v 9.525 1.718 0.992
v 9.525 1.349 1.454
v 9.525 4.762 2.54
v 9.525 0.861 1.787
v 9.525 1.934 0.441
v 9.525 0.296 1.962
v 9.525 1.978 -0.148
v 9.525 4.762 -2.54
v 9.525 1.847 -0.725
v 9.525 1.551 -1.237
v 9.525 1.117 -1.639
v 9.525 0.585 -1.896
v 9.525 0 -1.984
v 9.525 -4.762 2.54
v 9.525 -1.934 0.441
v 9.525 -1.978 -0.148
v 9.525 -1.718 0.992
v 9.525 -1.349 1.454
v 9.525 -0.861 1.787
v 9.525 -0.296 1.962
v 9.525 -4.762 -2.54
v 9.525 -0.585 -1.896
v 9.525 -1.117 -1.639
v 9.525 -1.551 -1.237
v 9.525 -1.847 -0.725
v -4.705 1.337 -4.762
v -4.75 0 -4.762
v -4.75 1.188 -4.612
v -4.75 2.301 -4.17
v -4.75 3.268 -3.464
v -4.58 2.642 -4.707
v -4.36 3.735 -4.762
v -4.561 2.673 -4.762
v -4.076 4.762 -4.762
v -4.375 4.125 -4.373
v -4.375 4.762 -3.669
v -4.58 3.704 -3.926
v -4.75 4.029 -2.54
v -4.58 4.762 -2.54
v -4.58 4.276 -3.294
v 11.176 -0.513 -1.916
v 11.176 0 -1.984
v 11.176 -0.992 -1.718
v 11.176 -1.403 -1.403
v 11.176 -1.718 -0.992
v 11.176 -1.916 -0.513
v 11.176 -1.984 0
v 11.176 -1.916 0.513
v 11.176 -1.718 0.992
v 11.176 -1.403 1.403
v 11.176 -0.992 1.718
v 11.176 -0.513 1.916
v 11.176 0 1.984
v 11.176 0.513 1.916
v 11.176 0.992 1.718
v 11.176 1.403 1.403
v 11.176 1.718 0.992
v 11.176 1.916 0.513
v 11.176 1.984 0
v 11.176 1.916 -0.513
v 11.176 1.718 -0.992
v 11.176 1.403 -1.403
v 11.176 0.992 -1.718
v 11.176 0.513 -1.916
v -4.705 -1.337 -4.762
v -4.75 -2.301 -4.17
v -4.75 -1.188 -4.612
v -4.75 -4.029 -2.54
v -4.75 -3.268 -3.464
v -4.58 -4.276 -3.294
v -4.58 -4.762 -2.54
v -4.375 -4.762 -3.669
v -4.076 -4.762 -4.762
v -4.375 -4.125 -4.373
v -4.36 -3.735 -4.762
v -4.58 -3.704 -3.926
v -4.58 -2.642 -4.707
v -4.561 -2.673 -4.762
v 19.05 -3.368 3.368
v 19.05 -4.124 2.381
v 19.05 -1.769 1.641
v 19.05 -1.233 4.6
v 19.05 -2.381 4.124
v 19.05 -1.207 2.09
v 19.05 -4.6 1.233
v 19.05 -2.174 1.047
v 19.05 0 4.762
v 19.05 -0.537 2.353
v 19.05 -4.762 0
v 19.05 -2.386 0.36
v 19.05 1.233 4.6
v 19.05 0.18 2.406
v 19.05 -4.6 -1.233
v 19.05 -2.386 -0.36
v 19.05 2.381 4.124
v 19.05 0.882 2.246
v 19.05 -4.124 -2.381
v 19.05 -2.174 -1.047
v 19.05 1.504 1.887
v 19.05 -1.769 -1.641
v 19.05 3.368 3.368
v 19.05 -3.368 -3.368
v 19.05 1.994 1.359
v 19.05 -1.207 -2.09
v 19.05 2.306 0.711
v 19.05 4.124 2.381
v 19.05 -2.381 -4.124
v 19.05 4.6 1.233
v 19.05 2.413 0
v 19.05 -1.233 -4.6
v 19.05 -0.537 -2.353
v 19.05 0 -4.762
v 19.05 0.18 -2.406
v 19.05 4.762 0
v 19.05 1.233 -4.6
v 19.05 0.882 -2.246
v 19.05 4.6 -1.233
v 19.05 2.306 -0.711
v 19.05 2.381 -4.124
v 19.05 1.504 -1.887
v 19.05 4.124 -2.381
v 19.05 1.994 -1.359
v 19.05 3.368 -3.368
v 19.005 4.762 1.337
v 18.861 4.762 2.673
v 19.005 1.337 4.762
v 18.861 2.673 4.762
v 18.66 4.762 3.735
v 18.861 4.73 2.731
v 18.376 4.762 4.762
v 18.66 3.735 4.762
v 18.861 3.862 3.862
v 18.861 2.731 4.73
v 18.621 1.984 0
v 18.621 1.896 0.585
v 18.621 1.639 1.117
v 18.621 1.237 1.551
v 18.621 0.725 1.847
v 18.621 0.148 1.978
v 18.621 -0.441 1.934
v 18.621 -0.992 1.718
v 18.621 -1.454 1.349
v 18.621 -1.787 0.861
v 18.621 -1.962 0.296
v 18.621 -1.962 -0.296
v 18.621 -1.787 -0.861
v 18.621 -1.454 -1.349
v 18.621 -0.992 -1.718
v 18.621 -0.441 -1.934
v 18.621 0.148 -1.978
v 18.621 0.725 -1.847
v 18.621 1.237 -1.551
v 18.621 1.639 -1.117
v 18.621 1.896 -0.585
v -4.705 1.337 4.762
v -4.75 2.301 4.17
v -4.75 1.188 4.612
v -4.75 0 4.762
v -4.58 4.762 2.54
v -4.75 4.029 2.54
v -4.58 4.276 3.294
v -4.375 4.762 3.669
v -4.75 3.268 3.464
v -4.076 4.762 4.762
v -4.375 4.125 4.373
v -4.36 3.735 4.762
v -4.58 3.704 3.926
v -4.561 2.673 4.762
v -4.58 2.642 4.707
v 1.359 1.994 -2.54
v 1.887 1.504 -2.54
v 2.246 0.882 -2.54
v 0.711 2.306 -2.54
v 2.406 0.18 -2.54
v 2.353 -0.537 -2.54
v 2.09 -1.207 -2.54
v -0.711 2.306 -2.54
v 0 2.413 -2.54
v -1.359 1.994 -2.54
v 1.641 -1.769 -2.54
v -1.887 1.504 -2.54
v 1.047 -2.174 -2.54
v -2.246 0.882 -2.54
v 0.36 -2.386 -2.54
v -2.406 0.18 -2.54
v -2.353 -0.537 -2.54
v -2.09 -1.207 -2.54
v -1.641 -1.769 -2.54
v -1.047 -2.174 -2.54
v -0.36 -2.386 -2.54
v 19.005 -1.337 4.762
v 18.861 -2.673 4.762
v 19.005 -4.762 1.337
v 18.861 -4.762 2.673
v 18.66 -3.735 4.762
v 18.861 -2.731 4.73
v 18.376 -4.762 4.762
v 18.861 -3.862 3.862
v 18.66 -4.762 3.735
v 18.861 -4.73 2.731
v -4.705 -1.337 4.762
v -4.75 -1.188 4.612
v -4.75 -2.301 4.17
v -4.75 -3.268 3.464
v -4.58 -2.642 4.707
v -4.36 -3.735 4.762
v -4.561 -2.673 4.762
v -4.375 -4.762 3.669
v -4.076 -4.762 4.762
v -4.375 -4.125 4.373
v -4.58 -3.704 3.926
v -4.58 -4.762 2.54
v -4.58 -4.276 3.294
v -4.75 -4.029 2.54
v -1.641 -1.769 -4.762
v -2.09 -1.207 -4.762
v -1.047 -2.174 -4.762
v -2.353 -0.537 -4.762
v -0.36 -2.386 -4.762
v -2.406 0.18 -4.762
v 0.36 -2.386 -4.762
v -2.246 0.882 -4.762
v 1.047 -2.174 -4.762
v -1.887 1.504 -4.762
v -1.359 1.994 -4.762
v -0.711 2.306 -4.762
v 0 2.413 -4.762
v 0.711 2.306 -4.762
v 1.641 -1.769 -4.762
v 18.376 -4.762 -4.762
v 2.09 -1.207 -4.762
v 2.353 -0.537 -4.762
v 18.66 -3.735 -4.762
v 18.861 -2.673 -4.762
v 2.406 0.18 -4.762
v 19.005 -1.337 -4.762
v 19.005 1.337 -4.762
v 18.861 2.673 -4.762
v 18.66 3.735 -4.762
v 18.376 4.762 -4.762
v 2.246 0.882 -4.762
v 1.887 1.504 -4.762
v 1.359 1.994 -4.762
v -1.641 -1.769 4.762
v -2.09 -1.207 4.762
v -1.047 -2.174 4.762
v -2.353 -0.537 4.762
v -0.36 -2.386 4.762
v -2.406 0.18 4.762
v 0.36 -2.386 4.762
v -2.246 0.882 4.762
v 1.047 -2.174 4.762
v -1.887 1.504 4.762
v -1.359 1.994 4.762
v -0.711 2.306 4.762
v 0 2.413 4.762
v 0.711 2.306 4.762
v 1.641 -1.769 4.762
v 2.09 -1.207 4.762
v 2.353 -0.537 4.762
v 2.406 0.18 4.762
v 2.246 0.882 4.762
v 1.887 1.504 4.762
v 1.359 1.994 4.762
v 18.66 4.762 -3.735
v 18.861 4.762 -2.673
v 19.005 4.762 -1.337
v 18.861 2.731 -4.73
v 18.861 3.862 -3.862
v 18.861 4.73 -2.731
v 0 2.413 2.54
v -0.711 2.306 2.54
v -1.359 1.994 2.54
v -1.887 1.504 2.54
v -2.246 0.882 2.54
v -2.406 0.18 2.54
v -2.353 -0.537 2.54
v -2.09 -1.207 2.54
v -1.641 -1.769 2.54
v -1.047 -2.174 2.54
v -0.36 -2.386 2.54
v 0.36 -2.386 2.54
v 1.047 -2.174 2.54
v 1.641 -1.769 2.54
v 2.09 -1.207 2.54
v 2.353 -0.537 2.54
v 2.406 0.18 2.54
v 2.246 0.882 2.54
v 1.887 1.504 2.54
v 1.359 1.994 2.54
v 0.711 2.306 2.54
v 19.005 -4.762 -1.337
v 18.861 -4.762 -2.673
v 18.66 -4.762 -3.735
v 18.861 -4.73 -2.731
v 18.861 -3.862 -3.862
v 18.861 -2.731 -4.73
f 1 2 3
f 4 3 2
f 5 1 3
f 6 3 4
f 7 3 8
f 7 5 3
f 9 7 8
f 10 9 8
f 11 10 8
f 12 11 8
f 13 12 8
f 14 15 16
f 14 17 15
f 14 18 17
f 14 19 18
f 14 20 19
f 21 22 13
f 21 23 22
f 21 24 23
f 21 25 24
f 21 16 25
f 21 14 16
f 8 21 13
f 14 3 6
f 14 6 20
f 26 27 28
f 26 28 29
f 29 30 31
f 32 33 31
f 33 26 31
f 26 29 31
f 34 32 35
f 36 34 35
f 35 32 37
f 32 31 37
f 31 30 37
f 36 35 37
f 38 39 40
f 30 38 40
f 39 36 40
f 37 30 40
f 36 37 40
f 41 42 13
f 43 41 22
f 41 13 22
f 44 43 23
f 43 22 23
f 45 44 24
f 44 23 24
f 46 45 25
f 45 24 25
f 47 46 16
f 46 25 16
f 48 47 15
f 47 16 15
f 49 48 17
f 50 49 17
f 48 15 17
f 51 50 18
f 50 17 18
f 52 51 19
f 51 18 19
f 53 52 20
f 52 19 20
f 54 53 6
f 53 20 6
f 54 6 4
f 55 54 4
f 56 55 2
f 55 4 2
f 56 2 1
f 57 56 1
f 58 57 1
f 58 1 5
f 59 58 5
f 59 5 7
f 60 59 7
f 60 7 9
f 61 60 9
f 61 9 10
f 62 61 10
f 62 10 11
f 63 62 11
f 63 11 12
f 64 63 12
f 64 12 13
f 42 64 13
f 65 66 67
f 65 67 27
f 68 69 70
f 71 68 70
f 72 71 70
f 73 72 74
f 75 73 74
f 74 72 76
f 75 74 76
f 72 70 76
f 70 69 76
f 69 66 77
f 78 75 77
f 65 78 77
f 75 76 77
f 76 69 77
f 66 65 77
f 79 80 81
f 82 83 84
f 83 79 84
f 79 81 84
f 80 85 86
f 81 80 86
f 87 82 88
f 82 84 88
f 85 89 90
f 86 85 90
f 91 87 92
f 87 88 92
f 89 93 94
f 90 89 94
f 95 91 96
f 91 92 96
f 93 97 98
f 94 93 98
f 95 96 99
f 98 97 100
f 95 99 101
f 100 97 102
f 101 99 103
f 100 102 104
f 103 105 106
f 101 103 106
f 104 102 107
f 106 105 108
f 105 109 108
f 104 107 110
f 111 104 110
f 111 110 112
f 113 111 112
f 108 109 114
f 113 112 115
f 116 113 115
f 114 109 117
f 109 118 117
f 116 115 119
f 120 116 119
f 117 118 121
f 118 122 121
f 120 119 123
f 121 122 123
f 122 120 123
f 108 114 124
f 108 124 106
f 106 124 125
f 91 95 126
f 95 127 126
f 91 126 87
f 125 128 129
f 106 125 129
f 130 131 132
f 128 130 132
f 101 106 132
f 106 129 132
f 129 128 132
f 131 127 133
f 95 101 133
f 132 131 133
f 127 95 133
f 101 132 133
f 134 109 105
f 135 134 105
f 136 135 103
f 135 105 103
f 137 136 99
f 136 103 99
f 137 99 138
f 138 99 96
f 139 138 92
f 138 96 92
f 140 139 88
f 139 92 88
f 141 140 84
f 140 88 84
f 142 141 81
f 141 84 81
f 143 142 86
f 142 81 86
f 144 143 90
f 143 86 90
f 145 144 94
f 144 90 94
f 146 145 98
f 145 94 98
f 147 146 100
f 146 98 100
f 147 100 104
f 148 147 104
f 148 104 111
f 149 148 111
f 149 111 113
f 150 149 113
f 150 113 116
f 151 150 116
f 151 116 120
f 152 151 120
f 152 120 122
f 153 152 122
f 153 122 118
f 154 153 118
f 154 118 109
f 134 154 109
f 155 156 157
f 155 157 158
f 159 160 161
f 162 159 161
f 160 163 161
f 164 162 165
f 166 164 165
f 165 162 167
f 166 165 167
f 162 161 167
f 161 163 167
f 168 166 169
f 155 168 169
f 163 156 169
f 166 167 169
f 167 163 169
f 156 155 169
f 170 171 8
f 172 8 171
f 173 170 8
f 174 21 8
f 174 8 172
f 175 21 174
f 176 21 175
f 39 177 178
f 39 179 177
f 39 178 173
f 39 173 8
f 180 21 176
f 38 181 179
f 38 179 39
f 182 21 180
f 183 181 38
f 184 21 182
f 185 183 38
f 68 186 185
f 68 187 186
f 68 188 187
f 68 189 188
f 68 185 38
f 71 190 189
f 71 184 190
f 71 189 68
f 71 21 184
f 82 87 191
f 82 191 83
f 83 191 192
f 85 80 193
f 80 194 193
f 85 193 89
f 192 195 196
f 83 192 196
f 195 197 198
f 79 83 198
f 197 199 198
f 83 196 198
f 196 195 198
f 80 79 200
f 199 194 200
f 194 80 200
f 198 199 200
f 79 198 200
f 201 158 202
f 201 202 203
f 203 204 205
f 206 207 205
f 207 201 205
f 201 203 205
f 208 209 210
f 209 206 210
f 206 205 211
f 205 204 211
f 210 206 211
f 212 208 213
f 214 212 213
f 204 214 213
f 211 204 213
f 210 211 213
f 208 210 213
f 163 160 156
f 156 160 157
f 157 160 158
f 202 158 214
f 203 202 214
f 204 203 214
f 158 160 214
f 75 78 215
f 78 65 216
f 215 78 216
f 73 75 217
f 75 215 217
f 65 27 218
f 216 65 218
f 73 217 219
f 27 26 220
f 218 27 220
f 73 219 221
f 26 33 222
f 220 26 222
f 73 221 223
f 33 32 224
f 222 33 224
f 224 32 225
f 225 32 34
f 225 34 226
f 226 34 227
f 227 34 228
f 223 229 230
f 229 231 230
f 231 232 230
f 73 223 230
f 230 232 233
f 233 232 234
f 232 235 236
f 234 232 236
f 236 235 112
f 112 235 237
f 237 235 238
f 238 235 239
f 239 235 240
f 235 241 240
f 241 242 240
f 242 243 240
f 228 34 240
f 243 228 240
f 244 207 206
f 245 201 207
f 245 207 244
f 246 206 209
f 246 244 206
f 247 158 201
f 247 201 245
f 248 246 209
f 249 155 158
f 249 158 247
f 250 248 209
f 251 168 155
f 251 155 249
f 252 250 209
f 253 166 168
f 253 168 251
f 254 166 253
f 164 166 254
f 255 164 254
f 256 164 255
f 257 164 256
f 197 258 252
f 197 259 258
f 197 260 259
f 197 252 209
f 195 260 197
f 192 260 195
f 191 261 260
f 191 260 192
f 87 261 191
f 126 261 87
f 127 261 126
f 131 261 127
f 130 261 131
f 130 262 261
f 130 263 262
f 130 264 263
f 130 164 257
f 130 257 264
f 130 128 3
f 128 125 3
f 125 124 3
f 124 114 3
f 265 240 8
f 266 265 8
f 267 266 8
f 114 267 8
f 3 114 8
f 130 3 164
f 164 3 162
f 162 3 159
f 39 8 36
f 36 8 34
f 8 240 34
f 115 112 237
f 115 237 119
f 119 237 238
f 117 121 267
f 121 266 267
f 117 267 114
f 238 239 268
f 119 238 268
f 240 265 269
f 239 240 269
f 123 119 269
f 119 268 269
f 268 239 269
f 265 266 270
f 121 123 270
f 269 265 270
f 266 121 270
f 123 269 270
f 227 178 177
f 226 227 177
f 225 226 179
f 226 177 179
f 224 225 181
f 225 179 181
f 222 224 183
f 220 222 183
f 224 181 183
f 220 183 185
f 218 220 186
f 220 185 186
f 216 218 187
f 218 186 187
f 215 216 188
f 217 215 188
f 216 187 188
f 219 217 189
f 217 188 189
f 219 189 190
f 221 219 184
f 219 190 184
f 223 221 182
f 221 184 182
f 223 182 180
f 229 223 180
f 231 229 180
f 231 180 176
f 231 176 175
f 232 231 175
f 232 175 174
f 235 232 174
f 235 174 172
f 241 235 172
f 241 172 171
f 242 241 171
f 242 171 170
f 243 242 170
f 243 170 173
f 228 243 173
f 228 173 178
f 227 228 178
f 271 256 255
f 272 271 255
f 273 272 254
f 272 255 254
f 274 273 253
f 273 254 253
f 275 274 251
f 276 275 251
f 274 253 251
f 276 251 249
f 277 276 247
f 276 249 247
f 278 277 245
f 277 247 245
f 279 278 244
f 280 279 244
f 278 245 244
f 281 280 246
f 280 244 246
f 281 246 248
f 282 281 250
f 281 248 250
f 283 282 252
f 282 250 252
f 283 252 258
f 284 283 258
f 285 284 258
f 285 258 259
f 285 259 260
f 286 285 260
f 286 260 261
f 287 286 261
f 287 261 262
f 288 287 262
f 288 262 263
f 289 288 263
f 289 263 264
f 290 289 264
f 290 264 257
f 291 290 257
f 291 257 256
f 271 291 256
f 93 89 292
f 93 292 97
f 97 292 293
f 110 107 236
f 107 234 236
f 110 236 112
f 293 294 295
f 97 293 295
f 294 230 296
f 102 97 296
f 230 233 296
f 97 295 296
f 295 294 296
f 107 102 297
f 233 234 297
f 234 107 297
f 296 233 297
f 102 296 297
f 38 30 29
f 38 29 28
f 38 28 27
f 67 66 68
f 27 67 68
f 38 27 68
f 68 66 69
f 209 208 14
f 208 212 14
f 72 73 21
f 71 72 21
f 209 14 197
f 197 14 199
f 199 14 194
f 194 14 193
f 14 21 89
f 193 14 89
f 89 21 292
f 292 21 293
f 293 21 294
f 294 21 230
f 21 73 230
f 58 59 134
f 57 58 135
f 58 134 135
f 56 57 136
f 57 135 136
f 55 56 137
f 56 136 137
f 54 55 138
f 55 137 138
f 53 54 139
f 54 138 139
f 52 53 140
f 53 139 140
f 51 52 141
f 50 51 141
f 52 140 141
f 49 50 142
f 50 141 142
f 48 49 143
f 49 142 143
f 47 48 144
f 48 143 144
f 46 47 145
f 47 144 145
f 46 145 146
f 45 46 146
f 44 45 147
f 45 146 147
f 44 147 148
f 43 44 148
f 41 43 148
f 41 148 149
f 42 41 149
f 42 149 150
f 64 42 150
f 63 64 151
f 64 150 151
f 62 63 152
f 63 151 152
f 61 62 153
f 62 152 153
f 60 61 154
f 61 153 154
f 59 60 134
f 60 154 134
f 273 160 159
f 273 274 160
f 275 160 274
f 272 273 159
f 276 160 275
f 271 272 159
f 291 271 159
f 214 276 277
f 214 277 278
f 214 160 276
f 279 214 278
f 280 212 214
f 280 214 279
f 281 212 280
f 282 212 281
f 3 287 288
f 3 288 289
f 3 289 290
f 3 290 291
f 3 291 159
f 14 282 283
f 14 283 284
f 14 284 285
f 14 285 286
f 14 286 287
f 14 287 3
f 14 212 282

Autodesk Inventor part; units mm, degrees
sketch "Sketch_1" plane through (0, 0, 0) normal (0, 0, 1) x (1, 0, 0)
  line L0 (-4.7498, -4.7625) -> (19.05, -4.7625)
  line L1 (19.05, -4.7625) -> (19.05, 4.7625)
  line L2 (19.05, 4.7625) -> (-4.7498, 4.7625)
  line L3 (-4.7498, 4.7625) -> (-4.7498, -4.7625)
extrude "Extrusion1" add sketch "Sketch_1" along normal mid plane 9.525
sketch "Sketch_2" plane through (0, 0, 0) normal (0, 1, 0) x (-1, 0, 0)
  line L0 (4.7498, 2.54) -> (-9.525, 2.54)
  line L1 (-9.525, 2.54) -> (-9.525, -2.54)
  line L2 (-9.525, -2.54) -> (4.7498, -2.54)
  line L3 (4.7498, -2.54) -> (4.7498, 2.54)
extrude "Extrusion2" cut sketch "Sketch_2" along normal mid plane 9.525
sketch "Sketch_3" plane through (0, 0, 0) normal (0, 0, 1) x (1, 0, 0)
  line L0 (19.05, 0) -> (11.176, 0)
  line L1 (11.176, 0) -> (11.176, 1.9837)
  line L2 (11.176, 1.9837) -> (18.6207, 1.9837)
  line L3 (18.6207, 1.9837) -> (19.05, 2.413)
  line L4 (19.05, 2.413) -> (19.05, 0)
  line L5 (19.05, 0) -> (11.176, 0)
revolve "Revolution1" cut sketch "Sketch_3" angle 360 about axis through (19.05, 0, 0) along (1, 0, 0)
sketch "Sketch5" plane through (11.176, 0, 0) normal (1, 0, 0) x (0, 0, -1)
  point P0 (0, 0)
hole "Hole1" at (11.176, 0, 0) direction (-1, 0, 0) diameter 3.9675 depth 1.651
sketch "Sketch6" plane through (0, 0, -4.7625) normal (0, 0, -1) x (-1, 0, 0)
  point P0 (0, 0)
hole "Hole2" at (0, 0, -4.7625) direction (0, 0, 1) diameter 4.826 depth 9.525
sketch "Sketch_9" plane through (0, 0, 0) normal (0, 0, 1) x (1, 0, 0)
  line L0 (23.8125, 0) -> (19.05, 0)
  line L1 (19.05, 0) -> (19.05, 4.7625)
  arc A0 (19.05, 4.7625) -> (16.51, 9.525) centre (8.8503, 2.3812) ccw
  line L2 (16.51, 9.525) -> (23.8125, 9.525)
  line L3 (23.8125, 9.525) -> (23.8125, 0)
  line L4 (23.8125, 0) -> (19.05, 0)
revolve "Revolution2" cut sketch "Sketch_9" angle 360 about axis through (23.8125, 0, 0) along (1, 0, 0)
sketch "Sketch_10" plane through (0, 0, 0) normal (0, 0, 1) x (1, 0, 0)
  line L0 (-4.7498, 0) -> (-9.5123, 0)
  line L1 (-9.5123, 0) -> (-9.5123, 9.525)
  line L2 (-9.5123, 9.525) -> (-2.2098, 9.525)
  arc A0 (-2.2098, 9.525) -> (-4.7498, 4.7625) centre (5.4499, 2.3813) ccw
  line L3 (-4.7498, 4.7625) -> (-4.7498, 0)
  line L4 (-4.7498, 0) -> (-9.5123, 0)
revolve "Revolution3" cut sketch "Sketch_10" angle 360 about axis through (-4.7498, 0, 0) along (1, 0, 0)
ref_plane "dummy_XY" through (0, 0, 0) normal (0, 0, 1) x (1, 0, 0)
ref_plane "dummy_YZ" through (0, 0, 0) normal (1, 0, 0) x (0, 1, 0)
ref_plane "dummy_ZX" through (0, 0, 0) normal (0, 1, 0) x (0, 0, 1)
ref_plane "h1_XY" through (-4.7498, 4.7625, 0) normal (0, 0, 1) x (1, 0, 0)
ref_plane "h1_YZ" through (-4.7498, 4.7625, 0) normal (1, 0, 0) x (0, 1, 0)
ref_plane "h1_ZX" through (-4.7498, 4.7625, 0) normal (0, 1, 0) x (0, 0, 1)
ref_plane "h2_XY" through (-4.7498, -4.7625, 0) normal (0, 0, 1) x (1, 0, 0)
ref_plane "h2_YZ" through (-4.7498, -4.7625, 0) normal (1, 0, 0) x (0, 1, 0)
ref_plane "h2_ZX" through (-4.7498, -4.7625, 0) normal (0, 1, 0) x (0, 0, 1)
ref_plane "l1_XY" through (19.05, 4.7625, 0) normal (0, 0, 1) x (1, 0, 0)
ref_plane "l1_YZ" through (19.05, 4.7625, 0) normal (1, 0, 0) x (0, 1, 0)
ref_plane "l1_ZX" through (19.05, 4.7625, 0) normal (0, 1, 0) x (0, 0, 1)
ref_plane "l11_XY" through (19.05, 4.7625, 0) normal (0, 0, 1) x (1, 0, 0)
ref_plane "l11_YZ" through (19.05, 4.7625, 0) normal (1, 0, 0) x (0, 1, 0)
ref_plane "l11_ZX" through (19.05, 4.7625, 0) normal (0, 1, 0) x (0, 0, 1)
ref_plane "l12_XY" through (0, 4.7625, 0) normal (0, 0, 1) x (1, 0, 0)
ref_plane "l12_YZ" through (0, 4.7625, 0) normal (1, 0, 0) x (0, 1, 0)
ref_plane "l12_ZX" through (0, 4.7625, 0) normal (0, 1, 0) x (0, 0, 1)
ref_plane "l2_XY" through (-4.7498, 4.7625, 0) normal (0, 0, 1) x (1, 0, 0)
ref_plane "l2_YZ" through (-4.7498, 4.7625, 0) normal (1, 0, 0) x (0, 1, 0)
ref_plane "l2_ZX" through (-4.7498, 4.7625, 0) normal (0, 1, 0) x (0, 0, 1)
ref_plane "l21_XY" through (19.05, 0, 0) normal (0, 1, 0) x (1, 0, 0)
ref_plane "l21_YZ" through (19.05, 0, 0) normal (1, 0, 0) x (0, 0, -1)
ref_plane "l21_ZX" through (19.05, 0, 0) normal (0, 0, -1) x (0, 1, 0)
ref_plane "l22_XY" through (9.525, 0, 0) normal (0, 1, 0) x (1, 0, 0)
ref_plane "l22_YZ" through (9.525, 0, 0) normal (1, 0, 0) x (0, 0, -1)
ref_plane "l22_ZX" through (9.525, 0, 0) normal (0, 0, -1) x (0, 1, 0)
ref_plane "piston_rod_clevis_XY" through (19.05, 0, 0) normal (1, 0, 0) x (0, 0, -1)
ref_plane "piston_rod_clevis_YZ" through (19.05, 0, 0) normal (0, 0, -1) x (0, 1, 0)
ref_plane "piston_rod_clevis_ZX" through (19.05, 0, 0) normal (0, 1, 0) x (1, 0, 0)
ref_plane "rod_clevis_body_XY" through (0, 0, 0) normal (0, 0, 1) x (1, 0, 0)
ref_plane "rod_clevis_body_YZ" through (0, 0, 0) normal (1, 0, 0) x (0, 1, 0)
ref_plane "rod_clevis_body_ZX" through (0, 0, 0) normal (0, 1, 0) x (0, 0, 1)
ref_plane "th1_XY" through (19.05, 2.413, 0) normal (0, 0, 1) x (1, 0, 0)
ref_plane "th1_YZ" through (19.05, 2.413, 0) normal (1, 0, 0) x (0, 1, 0)
ref_plane "th1_ZX" through (19.05, 2.413, 0) normal (0, 1, 0) x (0, 0, 1)
ref_plane "th2_XY" through (19.05, -2.413, 0) normal (0, 0, 1) x (1, 0, 0)
ref_plane "th2_YZ" through (19.05, -2.413, 0) normal (1, 0, 0) x (0, 1, 0)
ref_plane "th2_ZX" through (19.05, -2.413, 0) normal (0, 1, 0) x (0, 0, 1)
ref_plane "to_cylinder_XY" through (9.525, 0, 0) normal (1, 0, 0) x (0, 0, -1)
ref_plane "to_cylinder_YZ" through (9.525, 0, 0) normal (0, 0, -1) x (0, 1, 0)
ref_plane "to_cylinder_ZX" through (9.525, 0, 0) normal (0, 1, 0) x (1, 0, 0)
ref_plane "w1_XY" through (19.05, 0, -4.7625) normal (0, 1, 0) x (1, 0, 0)
ref_plane "w1_YZ" through (19.05, 0, -4.7625) normal (1, 0, 0) x (0, 0, -1)
ref_plane "w1_ZX" through (19.05, 0, -4.7625) normal (0, 0, -1) x (0, 1, 0)
ref_plane "w11_XY" through (-4.7498, 0, -2.54) normal (0, 1, 0) x (1, 0, 0)
ref_plane "w11_YZ" through (-4.7498, 0, -2.54) normal (1, 0, 0) x (0, 0, -1)
ref_plane "w11_ZX" through (-4.7498, 0, -2.54) normal (0, 0, -1) x (0, 1, 0)
ref_plane "w12_XY" through (-4.7498, 0, 2.54) normal (0, 1, 0) x (1, 0, 0)
ref_plane "w12_YZ" through (-4.7498, 0, 2.54) normal (1, 0, 0) x (0, 0, -1)
ref_plane "w12_ZX" through (-4.7498, 0, 2.54) normal (0, 0, -1) x (0, 1, 0)
ref_plane "w2_XY" through (19.05, 0, 4.7625) normal (0, 1, 0) x (1, 0, 0)
ref_plane "w2_YZ" through (19.05, 0, 4.7625) normal (1, 0, 0) x (0, 0, -1)
ref_plane "w2_ZX" through (19.05, 0, 4.7625) normal (0, 0, -1) x (0, 1, 0)
properties part number "D-14043"
